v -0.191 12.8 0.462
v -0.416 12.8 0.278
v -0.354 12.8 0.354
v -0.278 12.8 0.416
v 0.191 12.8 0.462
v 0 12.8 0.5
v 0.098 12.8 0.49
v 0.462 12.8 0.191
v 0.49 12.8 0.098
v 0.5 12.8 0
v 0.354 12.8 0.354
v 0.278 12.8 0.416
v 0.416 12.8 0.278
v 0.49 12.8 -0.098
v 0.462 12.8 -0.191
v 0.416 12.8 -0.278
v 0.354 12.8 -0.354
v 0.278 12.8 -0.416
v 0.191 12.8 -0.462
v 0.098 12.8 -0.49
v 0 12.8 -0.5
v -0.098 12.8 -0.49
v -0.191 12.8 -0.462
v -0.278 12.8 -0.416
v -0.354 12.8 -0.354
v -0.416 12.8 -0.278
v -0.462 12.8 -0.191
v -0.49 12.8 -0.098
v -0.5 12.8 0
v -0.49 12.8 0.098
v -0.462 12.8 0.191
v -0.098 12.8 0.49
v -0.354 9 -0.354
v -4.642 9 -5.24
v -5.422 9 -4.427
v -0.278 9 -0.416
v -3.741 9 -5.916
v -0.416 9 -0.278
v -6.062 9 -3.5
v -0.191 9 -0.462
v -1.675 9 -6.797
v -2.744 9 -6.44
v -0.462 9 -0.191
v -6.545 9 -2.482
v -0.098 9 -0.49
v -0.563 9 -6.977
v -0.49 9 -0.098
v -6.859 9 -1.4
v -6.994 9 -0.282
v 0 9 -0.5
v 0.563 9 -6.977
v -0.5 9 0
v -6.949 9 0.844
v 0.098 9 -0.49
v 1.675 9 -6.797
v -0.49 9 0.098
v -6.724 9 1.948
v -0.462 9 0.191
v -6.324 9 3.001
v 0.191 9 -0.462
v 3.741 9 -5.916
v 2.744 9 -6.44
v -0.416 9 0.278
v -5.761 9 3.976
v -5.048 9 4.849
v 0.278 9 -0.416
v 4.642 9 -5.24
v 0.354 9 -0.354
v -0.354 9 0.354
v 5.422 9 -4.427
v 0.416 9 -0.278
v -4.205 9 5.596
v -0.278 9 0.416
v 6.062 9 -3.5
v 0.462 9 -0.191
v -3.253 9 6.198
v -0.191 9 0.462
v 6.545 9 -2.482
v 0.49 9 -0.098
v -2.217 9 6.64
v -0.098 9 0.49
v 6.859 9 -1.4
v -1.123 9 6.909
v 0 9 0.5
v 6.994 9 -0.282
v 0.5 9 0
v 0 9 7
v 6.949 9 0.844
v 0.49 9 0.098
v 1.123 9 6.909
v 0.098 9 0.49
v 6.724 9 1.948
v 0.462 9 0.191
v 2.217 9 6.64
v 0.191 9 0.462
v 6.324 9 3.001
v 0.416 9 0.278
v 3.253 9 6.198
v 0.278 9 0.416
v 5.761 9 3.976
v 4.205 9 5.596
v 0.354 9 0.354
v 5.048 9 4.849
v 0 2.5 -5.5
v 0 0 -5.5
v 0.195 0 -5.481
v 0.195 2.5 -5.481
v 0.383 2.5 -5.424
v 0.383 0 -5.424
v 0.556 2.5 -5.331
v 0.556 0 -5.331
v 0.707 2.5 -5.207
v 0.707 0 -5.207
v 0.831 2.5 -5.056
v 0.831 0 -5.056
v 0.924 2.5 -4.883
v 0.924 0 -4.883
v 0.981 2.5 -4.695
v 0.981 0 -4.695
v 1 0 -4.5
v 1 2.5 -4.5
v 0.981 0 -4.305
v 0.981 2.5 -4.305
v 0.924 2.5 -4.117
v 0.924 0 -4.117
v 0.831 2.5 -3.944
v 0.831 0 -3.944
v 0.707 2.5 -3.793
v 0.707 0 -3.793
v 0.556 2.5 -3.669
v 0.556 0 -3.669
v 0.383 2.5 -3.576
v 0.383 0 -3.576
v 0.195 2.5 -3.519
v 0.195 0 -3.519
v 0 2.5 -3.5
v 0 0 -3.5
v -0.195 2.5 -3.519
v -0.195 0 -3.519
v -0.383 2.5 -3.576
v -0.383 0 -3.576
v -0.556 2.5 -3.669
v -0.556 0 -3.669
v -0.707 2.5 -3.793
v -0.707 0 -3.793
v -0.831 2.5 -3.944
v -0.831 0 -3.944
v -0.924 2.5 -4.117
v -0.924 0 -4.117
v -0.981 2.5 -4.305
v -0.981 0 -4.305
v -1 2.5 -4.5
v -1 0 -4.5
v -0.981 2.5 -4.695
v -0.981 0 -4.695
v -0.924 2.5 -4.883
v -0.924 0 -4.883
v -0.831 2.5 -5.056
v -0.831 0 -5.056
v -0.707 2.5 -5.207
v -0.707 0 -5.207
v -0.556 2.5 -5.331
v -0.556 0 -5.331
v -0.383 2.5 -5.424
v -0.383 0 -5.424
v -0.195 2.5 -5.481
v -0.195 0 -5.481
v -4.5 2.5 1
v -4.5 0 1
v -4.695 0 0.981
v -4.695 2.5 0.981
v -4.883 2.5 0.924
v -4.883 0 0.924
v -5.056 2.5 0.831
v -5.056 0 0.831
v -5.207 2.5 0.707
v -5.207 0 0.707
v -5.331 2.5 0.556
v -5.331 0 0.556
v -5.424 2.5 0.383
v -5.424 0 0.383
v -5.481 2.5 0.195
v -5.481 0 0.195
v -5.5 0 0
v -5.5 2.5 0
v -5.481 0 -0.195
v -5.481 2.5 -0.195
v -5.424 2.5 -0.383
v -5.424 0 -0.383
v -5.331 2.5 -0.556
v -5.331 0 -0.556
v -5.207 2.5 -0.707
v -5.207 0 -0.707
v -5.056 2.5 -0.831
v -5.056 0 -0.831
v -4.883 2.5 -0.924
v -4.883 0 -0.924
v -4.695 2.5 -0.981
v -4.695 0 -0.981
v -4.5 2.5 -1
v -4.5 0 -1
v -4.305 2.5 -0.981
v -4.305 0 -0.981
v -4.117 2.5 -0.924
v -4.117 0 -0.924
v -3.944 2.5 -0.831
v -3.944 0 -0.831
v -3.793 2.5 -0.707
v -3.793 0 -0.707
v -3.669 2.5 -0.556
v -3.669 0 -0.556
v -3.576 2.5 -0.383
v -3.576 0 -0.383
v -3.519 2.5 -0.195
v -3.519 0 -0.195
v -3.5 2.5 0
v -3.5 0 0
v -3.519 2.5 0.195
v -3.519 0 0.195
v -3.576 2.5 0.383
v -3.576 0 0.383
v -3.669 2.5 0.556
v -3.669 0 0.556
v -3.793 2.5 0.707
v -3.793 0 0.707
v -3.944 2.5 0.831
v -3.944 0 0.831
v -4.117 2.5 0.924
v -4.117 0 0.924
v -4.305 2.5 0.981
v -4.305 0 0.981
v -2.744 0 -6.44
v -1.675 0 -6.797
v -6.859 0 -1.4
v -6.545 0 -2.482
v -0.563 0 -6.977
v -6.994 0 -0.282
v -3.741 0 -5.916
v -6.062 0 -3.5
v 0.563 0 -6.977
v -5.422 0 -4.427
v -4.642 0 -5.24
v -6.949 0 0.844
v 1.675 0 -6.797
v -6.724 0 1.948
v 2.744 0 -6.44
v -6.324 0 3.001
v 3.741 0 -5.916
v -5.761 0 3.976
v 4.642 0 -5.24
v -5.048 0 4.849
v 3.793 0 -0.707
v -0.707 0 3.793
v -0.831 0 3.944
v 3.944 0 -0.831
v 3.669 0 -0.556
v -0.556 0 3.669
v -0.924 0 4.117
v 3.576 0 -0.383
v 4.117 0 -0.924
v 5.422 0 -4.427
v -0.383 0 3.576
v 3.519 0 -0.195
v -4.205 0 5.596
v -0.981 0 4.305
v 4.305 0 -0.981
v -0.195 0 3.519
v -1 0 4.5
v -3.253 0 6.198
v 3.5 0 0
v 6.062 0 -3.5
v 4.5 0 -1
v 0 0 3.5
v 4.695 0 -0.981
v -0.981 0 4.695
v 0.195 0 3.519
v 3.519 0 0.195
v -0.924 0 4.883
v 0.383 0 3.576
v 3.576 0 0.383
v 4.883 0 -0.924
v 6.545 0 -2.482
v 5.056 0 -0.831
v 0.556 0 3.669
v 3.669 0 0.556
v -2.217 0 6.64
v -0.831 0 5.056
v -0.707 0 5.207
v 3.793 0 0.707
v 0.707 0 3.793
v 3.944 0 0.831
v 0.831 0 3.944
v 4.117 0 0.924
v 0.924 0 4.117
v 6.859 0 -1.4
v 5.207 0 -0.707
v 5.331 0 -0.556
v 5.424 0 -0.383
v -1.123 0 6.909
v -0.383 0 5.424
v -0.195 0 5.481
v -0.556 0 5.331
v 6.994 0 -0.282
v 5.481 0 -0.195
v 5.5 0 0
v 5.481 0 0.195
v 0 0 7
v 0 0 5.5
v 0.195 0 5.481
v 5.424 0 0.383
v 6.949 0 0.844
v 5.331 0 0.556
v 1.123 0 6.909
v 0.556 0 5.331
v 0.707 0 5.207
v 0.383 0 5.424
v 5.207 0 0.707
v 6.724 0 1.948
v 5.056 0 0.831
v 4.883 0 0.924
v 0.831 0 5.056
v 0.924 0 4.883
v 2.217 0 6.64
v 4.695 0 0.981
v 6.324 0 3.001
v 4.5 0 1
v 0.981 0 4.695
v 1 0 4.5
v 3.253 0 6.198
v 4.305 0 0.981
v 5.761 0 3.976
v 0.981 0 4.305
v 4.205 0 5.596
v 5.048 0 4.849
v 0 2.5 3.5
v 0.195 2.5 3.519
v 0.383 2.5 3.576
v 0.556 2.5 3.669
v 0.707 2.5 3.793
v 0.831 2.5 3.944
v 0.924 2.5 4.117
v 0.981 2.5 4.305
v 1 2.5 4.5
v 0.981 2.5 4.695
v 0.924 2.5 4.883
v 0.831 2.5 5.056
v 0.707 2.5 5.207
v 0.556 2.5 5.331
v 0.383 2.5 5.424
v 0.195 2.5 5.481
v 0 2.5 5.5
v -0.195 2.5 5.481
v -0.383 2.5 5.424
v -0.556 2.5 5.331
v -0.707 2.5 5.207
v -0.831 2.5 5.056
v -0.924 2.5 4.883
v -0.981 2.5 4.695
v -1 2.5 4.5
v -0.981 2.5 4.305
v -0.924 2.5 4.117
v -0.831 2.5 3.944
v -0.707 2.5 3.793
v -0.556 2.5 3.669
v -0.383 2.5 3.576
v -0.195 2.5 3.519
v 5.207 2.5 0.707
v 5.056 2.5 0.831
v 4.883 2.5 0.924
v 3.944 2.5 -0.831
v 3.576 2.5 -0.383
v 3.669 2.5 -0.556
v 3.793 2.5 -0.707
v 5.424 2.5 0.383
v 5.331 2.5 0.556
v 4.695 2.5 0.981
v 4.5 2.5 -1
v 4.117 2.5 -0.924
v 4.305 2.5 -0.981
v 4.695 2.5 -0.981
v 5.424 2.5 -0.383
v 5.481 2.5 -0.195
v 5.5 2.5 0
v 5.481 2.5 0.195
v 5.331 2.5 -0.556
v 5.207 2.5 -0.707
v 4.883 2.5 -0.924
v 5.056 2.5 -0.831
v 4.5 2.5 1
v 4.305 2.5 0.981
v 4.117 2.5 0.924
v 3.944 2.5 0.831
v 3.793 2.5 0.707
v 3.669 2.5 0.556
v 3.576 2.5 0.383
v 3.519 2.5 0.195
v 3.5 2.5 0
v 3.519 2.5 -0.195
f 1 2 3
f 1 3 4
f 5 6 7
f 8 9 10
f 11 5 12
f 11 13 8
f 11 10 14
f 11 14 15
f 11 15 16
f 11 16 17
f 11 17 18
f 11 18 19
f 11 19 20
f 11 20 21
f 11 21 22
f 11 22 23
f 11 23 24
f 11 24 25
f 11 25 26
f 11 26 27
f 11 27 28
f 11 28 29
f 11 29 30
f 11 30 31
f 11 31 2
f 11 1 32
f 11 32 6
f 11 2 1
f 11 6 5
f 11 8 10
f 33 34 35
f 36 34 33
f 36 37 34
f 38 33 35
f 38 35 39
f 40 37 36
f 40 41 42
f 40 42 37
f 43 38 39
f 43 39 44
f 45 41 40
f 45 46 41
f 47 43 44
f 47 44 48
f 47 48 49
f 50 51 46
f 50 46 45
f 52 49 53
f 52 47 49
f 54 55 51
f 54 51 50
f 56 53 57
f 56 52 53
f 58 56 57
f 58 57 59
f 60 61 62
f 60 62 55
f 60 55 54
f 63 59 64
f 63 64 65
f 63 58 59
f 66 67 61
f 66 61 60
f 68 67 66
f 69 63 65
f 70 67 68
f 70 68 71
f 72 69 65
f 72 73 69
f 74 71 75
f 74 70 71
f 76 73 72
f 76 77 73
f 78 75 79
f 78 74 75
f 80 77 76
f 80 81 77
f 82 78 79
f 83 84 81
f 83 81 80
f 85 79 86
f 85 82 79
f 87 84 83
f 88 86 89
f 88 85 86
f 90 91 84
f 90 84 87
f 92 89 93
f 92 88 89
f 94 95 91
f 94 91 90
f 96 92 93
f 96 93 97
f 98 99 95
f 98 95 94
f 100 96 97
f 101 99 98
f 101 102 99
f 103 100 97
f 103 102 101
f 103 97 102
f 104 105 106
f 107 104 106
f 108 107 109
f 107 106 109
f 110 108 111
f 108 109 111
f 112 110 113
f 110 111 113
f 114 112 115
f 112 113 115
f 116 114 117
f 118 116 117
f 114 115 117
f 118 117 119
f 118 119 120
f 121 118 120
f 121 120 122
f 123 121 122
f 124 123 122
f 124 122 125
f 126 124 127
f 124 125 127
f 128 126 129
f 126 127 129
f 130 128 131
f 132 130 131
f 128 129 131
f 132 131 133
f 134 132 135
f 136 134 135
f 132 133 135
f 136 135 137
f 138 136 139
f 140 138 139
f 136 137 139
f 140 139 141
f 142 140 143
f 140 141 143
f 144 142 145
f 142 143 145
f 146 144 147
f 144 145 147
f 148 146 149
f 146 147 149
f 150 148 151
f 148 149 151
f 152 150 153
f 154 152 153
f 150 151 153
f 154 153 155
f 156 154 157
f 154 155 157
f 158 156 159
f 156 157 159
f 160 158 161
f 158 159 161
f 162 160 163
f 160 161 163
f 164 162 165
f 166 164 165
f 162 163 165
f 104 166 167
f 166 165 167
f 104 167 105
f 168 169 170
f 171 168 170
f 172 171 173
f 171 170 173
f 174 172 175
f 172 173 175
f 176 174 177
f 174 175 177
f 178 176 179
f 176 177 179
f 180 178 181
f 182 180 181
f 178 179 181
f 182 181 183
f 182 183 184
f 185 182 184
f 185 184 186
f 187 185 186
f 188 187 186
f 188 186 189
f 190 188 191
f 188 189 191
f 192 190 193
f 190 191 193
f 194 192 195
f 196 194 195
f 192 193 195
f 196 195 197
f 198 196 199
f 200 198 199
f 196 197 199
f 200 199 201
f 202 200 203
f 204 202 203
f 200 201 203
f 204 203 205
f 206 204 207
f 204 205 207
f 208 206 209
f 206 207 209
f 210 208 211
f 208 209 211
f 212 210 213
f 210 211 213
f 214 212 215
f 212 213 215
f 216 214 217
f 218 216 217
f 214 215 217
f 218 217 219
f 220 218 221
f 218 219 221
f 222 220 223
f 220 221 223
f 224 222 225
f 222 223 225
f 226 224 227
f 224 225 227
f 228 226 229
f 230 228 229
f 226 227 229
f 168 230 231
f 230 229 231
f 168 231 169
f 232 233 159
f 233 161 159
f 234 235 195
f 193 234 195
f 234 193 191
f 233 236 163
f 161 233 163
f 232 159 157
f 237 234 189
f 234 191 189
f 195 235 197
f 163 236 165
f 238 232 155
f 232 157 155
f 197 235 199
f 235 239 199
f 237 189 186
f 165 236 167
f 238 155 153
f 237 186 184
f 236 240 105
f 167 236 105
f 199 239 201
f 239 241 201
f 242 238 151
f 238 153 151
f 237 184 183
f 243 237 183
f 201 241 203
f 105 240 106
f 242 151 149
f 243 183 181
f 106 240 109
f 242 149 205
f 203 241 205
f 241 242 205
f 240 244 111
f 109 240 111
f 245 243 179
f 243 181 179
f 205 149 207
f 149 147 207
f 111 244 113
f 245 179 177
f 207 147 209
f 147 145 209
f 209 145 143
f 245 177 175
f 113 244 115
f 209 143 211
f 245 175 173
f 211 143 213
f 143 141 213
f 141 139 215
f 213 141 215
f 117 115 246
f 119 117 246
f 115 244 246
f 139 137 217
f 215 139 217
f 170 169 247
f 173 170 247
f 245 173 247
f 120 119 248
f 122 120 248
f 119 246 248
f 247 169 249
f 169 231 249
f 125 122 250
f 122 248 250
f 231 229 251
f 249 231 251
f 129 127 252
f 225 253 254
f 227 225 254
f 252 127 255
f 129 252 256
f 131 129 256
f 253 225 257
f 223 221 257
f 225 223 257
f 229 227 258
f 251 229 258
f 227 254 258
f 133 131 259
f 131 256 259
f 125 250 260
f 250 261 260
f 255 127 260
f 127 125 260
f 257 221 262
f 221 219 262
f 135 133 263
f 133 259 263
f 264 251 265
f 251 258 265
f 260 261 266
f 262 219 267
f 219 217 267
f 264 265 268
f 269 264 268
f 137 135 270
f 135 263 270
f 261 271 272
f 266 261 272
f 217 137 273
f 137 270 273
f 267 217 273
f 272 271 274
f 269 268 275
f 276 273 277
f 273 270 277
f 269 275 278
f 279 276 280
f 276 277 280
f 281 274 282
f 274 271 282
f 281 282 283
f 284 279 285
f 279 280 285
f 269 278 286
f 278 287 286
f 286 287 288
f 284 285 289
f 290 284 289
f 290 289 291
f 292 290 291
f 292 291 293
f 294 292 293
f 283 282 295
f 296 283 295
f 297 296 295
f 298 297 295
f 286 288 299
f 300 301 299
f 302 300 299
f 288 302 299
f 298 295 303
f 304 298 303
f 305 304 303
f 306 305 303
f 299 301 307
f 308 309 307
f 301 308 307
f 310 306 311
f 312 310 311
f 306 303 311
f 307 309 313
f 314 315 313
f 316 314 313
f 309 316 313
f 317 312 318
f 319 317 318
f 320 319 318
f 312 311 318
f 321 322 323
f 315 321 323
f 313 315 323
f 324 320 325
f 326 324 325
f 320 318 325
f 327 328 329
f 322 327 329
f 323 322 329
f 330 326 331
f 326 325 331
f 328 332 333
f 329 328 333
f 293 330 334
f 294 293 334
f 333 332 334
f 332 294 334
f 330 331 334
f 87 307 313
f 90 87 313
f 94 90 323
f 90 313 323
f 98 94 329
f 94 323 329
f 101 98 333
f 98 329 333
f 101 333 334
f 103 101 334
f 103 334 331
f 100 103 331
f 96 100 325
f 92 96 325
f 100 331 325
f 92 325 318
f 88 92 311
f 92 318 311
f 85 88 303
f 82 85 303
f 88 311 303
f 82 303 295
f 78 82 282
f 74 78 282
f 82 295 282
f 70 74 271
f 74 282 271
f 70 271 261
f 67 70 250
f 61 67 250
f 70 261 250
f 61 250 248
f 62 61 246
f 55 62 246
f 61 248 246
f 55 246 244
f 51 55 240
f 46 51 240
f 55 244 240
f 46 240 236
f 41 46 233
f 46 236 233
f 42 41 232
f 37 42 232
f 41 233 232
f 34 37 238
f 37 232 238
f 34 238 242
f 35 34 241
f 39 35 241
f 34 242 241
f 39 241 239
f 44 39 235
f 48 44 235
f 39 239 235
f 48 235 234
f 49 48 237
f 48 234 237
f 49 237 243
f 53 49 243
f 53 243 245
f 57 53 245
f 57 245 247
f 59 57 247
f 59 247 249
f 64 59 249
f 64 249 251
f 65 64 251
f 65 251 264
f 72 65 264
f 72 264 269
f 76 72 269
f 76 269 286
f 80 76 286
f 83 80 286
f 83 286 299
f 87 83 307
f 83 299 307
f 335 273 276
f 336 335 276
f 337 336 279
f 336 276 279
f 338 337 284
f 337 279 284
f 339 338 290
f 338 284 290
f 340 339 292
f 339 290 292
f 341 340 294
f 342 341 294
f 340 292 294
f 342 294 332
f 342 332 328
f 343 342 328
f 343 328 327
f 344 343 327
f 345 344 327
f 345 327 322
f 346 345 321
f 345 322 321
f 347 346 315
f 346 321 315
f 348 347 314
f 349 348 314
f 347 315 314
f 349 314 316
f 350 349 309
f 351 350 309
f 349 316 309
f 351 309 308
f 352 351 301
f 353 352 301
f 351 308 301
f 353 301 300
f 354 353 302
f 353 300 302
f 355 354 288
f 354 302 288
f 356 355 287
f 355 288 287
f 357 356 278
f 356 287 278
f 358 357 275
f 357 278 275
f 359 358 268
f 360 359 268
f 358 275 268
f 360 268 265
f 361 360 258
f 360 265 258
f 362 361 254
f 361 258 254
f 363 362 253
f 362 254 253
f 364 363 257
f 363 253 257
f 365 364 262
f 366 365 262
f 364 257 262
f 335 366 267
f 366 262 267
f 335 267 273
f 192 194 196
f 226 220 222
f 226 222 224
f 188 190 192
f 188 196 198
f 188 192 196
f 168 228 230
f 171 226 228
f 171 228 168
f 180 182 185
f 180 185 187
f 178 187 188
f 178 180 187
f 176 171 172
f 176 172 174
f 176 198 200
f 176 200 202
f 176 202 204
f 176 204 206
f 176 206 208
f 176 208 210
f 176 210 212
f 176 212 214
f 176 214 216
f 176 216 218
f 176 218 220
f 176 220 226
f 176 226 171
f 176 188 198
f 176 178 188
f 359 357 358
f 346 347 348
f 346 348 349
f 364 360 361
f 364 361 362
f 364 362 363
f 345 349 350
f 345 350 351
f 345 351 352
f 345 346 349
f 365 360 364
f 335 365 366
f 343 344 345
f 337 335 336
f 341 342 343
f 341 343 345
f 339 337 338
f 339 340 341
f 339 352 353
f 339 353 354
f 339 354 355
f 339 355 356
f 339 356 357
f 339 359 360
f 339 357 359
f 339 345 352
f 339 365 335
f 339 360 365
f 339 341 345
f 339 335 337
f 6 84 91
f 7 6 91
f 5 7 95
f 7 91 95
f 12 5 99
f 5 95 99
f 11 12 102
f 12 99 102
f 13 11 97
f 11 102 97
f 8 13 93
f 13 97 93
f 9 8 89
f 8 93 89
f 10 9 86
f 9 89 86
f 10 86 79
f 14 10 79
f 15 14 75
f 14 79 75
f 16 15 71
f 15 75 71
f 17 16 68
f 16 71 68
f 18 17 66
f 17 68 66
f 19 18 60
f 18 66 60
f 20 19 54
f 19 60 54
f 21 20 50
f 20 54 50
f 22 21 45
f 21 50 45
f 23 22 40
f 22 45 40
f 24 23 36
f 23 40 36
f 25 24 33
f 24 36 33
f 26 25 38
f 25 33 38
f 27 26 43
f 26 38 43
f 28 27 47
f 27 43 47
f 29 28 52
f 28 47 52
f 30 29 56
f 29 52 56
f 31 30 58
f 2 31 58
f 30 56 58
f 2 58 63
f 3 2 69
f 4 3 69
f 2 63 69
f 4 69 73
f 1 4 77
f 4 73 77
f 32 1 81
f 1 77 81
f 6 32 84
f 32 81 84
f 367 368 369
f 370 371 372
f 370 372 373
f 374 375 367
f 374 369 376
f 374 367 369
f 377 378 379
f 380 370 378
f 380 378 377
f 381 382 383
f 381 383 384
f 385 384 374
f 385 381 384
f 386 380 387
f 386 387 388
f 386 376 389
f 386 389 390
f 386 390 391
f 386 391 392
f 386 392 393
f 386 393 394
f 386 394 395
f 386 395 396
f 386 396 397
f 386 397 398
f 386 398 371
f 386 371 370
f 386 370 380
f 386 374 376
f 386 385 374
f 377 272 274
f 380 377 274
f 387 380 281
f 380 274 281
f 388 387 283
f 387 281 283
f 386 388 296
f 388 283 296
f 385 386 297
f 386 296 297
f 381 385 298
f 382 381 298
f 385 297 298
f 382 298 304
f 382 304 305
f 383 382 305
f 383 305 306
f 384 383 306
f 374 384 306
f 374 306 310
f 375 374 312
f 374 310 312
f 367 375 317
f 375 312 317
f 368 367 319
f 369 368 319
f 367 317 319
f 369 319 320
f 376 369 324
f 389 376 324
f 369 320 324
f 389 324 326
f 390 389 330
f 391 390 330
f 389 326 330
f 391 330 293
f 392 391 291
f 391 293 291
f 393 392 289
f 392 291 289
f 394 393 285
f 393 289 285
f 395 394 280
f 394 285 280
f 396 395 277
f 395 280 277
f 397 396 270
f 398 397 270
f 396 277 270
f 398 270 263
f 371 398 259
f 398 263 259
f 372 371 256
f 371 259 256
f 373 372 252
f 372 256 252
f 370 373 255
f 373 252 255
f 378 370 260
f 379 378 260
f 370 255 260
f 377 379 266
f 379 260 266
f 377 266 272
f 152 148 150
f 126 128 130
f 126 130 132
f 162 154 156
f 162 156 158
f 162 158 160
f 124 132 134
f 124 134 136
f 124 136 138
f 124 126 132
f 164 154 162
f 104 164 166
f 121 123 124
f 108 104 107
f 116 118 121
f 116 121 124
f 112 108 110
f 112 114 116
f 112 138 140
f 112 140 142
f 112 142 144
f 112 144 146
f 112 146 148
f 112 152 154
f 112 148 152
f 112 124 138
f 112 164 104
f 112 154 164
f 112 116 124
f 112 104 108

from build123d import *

# Parameters (mm, degrees)
SKETCH_1_R          = 7
EXTRUDE_1_DEPTH     = 9
SKETCH_2_R          = 1
CUT_EXTRUDE_2_DEPTH = 2.5
SKETCH_3_R          = 0.5
EXTRUDE_2_DEPTH     = 3.8


with BuildPart() as part:
    # 草图1 → 凸台-拉伸1 (new body)
    with BuildSketch(Plane(origin=(0, 0, 0), x_dir=(1, 0, 0), z_dir=(0, 1, 0))):
        with Locations(Location((0, 0, 0), (0, 0, 270))):
            Circle(SKETCH_1_R)
    extrude(amount=EXTRUDE_1_DEPTH)

    # 草图2 → 切除-拉伸2 (cut)
    with BuildSketch(Plane.XZ):
        with Locations(Location((0, 4.5, 0), (0, 0, 270))):
            Circle(SKETCH_2_R)
        with Locations(Location((0, -4.5, 0), (0, 0, 270))):
            Circle(SKETCH_2_R)
        with Locations(Location((4.5, 0, 0), (0, 0, 270))):
            Circle(SKETCH_2_R)
        with Locations(Location((-4.5, 0, 0), (0, 0, 90))):
            Circle(SKETCH_2_R)
    extrude(amount=-CUT_EXTRUDE_2_DEPTH, mode=Mode.SUBTRACT)

    # 草图3 → 凸台-拉伸2 (add)
    with BuildSketch(Plane(origin=(0, 9, 0), x_dir=(1, 0, 0), z_dir=(0, 1, 0))):
        with Locations(Location((0, 0, 0), (0, 0, 270))):
            Circle(SKETCH_3_R)
    extrude(amount=EXTRUDE_2_DEPTH)


solid = part.part
